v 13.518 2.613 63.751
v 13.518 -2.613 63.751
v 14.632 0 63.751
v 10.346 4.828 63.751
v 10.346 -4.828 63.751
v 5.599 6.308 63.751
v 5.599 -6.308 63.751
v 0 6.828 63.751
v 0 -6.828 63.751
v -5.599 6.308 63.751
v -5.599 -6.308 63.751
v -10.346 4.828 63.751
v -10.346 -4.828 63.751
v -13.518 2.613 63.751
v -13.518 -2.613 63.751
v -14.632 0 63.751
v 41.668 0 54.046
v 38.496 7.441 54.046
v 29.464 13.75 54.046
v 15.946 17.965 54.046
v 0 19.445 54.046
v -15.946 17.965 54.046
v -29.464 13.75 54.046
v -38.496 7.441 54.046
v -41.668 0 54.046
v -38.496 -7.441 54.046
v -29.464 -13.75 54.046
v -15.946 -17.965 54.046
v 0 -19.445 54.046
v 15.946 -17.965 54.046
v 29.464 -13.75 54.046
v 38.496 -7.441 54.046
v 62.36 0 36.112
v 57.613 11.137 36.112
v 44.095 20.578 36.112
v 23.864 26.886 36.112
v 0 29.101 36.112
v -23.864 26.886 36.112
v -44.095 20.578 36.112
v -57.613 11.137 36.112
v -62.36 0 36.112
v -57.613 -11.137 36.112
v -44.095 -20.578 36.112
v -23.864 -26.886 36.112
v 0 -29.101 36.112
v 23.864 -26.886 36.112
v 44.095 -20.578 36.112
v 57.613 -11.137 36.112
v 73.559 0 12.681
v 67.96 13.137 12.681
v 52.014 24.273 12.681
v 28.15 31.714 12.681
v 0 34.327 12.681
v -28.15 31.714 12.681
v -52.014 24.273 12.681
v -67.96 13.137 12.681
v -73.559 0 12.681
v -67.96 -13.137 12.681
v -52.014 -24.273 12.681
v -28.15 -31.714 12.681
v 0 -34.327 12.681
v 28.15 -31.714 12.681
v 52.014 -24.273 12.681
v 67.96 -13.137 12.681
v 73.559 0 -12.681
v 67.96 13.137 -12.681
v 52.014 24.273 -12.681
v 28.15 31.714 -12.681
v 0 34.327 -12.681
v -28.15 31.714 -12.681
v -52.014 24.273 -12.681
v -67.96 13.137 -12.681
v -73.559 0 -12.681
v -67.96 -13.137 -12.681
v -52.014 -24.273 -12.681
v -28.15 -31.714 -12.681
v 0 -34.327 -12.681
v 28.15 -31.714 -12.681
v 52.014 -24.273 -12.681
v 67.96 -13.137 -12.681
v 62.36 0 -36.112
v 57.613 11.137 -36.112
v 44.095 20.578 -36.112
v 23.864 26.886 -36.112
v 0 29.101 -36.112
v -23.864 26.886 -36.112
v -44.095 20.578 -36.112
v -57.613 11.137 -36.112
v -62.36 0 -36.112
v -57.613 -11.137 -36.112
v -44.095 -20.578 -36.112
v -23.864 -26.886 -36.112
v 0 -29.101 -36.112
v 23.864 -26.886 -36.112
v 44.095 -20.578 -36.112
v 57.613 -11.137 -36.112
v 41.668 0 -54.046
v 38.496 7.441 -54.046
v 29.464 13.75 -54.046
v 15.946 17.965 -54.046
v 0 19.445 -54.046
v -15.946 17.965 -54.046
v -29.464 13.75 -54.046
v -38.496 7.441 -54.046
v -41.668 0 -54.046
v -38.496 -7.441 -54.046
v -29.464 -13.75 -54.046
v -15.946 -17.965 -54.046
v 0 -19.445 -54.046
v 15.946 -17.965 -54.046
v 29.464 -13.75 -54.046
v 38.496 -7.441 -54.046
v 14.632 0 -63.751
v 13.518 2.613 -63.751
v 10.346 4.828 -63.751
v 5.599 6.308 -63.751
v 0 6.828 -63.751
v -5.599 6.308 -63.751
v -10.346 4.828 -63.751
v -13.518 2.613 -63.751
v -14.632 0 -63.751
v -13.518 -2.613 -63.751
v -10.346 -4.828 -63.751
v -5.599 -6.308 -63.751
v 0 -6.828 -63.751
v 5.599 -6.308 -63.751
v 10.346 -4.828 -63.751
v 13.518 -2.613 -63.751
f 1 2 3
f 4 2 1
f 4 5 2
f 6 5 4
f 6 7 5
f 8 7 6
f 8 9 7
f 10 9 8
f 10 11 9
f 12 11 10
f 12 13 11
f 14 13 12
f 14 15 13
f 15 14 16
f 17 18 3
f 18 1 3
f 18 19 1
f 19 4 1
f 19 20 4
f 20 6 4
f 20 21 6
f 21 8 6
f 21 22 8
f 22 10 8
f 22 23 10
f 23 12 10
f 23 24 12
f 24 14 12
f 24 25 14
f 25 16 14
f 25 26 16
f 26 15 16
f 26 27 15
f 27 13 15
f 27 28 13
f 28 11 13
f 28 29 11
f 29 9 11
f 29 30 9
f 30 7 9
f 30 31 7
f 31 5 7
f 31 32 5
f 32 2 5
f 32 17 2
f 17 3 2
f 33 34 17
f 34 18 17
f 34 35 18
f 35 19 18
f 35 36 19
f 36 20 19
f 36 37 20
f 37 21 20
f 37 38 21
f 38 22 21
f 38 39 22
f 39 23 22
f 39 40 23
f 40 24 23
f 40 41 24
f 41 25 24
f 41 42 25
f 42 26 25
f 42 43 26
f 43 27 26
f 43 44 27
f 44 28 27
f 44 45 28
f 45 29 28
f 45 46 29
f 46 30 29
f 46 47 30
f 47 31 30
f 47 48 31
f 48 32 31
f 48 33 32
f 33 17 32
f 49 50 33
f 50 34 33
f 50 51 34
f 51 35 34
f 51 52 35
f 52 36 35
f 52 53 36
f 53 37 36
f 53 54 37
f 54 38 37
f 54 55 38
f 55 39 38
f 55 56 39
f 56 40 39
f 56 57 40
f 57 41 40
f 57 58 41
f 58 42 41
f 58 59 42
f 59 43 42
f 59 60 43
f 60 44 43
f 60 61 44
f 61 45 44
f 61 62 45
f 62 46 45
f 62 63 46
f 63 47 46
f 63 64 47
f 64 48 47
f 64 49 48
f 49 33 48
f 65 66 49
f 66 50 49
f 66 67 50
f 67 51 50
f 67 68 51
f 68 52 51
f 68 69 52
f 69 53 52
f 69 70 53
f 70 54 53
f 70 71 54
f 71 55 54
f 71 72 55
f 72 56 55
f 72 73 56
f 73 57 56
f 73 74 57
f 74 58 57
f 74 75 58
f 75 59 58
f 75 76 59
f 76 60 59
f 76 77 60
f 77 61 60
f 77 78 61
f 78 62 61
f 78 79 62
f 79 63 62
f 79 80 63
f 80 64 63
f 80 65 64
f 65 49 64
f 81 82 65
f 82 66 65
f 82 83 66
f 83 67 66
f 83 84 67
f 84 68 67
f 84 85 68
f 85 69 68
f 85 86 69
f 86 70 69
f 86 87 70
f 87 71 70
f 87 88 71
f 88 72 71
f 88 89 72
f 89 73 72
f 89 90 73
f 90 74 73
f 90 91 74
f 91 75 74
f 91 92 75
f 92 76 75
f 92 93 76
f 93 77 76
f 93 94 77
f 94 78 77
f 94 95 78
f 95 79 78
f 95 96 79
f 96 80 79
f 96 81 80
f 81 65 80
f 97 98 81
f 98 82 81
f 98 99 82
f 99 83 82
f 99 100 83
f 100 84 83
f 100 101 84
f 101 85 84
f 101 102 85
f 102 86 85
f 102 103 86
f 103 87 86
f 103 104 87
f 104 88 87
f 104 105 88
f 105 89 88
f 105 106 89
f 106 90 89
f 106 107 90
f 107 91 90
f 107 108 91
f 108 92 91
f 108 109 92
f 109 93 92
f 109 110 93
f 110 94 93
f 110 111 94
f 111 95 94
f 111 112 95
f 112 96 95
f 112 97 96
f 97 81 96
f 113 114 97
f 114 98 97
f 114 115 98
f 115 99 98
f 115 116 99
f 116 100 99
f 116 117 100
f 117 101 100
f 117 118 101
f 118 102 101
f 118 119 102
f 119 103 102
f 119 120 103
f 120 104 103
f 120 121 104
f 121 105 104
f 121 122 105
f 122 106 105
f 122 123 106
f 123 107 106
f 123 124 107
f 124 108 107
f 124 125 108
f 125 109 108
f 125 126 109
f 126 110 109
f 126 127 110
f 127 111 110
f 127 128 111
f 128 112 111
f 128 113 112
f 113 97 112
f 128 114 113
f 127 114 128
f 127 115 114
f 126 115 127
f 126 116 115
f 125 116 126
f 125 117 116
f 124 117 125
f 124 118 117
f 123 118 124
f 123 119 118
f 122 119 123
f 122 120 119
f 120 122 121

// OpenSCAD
// Generated by SolidPython 1.0.1 on 2020-07-29 00:46:51


scale(v = [15, 7, 13]) {
	sphere(r = 5);
}
/***********************************************
*********      SolidPython code:      **********
************************************************
 
# import packages: SolidPython
from solid import *
from solid.utils import *
from itertools import chain, combinations, permutations


class Resize:

    def __init__(self, scad_file):
        self.scad_file = scad_file
        #self.scad_file = import_scad(scad_file)
        # cone/cylinder param:
        self.r1 = 0
        self.r2 = 0
        self.h = 0
        # rectangular prism param:
        self.w = 0
        self.l = 0
        # ellipse param:
        self.r = 0

    # import OpenScad code (file name corresponds to shape)


    # classify shape + parameters
    def assign(self, param1, param2, param3):
        if self.scad_file == 'cone.scad':
            self.r1 = param1
            self.r2 = param2
            self.h = param3
        elif self.scad_file == 'cylinder.scad':
            self.r1 = param1
            self.r2 = param2
            self.h = param3
        elif self.scad_file == 'rectangularPrism.scad':
            self.h = param1
            self.l = param2
            self.w = param3
        else:
            self.r = param1
            self.h = param2

    # resize parameters
    def iterate(self):
        x = range(3, 20, 2)
        i = 1
        if self.scad_file == 'cone.scad':
            tempList = list(permutations(x, 2))
            for temp in tempList:
                param1 = temp[0]
                param2 = temp[1]
                filepath = 'produced_scad_files/' + 'cone' + str(param1) + '_' + str(param2) + '_' + '.scad'
                scad_render_to_file(cylinder(h=param1, r1=param2, r2=0), filepath)

        elif self.scad_file == 'cylinder.scad':
            tempList = list(permutations(x, 3))
            for temp in tempList:
                param1 = temp[0]
                param2 = temp[1]
                filepath = 'produced_scad_files/' + 'cylinder' + str(param1) + '_' + str(param2) + '_' + '.scad'
                scad_render_to_file(cylinder(h=param1, r1=param2, r2=param2), filepath)

        elif self.scad_file == 'rectangularPrism.scad':
            tempList = list(permutations(x, 3))
            for temp in tempList:
                param1 = temp[0]
                param2 = temp[1]
                param3 = temp[2]
                filepath = 'produced_scad_files/' + 'rectangularPrism' + str(param1) + '_' + str(param2) + '_' + str(
                    param3) + '.scad'
                scad_render_to_file(cube(size=(param1, param2, param3)), filepath)

        elif self.scad_file == 'ellipse.scad':
            tempList = list(permutations(x, 4))
            for temp in tempList:
                param1 = temp[0]
                param2 = temp[1]
                param3 = temp[2]
                param4 = temp[3]
                filepath = 'produced_scad_files/' + 'ellipse' + str(param1) + '_' + str(param2) + '_' + str(param3) + '_' + str(param4) + '.scad'
                scad_render_to_file(scale([param1, param2, param3])(sphere(r=param4)), filepath)

    def render_to_scadfile(self):
        scad_render_to_file(scad, 'example.scad') 
 
************************************************/
